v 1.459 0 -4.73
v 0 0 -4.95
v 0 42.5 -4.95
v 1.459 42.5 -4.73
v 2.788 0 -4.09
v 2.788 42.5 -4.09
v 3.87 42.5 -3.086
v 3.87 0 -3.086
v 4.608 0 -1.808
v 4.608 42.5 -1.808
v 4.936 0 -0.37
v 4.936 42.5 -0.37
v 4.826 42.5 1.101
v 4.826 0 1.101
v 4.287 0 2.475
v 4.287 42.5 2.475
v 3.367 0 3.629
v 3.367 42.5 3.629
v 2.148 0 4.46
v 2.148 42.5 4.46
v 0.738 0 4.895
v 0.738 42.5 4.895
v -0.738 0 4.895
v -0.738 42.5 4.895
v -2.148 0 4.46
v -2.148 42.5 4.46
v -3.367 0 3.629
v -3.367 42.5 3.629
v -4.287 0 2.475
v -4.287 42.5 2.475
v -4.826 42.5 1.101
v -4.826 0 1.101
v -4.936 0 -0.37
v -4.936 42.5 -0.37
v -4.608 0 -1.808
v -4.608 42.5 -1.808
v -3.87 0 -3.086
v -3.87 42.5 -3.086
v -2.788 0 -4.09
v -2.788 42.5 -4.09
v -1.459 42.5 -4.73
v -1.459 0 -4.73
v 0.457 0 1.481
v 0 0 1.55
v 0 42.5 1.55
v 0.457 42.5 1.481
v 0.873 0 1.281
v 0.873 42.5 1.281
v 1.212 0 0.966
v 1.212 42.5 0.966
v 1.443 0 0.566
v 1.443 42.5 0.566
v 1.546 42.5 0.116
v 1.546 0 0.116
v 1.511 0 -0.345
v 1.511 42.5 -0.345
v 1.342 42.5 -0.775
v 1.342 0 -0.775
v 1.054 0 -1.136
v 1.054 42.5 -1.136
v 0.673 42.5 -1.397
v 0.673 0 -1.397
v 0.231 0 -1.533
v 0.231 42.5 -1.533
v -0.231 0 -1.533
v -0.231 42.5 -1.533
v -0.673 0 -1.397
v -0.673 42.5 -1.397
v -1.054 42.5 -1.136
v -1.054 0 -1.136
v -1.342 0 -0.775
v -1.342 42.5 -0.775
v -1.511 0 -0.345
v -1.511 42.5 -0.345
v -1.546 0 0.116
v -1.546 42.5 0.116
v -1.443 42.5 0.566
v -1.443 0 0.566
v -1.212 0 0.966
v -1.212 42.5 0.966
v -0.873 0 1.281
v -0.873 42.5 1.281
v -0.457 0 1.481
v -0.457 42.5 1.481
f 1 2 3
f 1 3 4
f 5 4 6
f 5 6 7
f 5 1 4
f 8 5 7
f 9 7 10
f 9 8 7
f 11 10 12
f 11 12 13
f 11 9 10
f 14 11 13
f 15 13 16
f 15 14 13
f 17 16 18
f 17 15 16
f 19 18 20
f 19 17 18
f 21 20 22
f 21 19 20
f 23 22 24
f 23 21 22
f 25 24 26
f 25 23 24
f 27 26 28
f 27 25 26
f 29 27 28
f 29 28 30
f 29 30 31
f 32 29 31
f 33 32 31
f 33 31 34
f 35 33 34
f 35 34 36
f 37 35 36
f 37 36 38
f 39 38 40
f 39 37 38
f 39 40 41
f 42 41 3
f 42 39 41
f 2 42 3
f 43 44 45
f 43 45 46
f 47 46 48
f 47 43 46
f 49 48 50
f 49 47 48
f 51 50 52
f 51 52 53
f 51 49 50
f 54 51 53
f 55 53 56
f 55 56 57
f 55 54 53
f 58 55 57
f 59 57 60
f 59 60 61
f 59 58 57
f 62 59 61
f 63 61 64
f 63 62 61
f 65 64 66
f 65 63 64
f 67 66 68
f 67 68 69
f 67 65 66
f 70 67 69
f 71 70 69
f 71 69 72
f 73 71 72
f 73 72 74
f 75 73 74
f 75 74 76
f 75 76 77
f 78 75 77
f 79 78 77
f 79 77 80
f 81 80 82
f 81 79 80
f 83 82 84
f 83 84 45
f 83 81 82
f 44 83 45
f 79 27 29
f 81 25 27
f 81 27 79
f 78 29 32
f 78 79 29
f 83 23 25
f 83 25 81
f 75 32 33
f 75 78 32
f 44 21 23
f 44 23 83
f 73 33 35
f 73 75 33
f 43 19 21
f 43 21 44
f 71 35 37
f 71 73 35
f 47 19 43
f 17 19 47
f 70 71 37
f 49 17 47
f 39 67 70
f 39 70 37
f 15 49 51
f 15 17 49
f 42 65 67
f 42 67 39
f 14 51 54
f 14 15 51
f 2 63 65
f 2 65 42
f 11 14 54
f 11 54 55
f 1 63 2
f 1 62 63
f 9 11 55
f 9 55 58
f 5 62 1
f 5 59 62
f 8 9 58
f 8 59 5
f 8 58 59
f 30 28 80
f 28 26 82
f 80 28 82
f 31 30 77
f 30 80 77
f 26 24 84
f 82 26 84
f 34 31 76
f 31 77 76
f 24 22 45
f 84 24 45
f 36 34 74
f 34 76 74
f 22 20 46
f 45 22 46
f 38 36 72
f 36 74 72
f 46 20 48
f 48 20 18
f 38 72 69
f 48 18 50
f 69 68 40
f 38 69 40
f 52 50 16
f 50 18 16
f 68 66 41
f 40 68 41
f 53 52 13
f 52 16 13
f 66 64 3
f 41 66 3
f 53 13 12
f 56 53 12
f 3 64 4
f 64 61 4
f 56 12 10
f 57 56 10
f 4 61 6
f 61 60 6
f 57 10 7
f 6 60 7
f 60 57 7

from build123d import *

# Parameters (mm, degrees)
SKETCH_1_R      = 4.725
SKETCH_1_R_2    = 1.55
EXTRUDE_1_DEPTH = 42.5
EXTRUDE_START   = -42.5
SKETCH_2_R      = 4.85
SKETCH_2_R_2    = 4.725
EXTRUDE_2_DEPTH = 42.5
SKETCH_3_R      = 4.875
SKETCH_3_R_2    = 4.85
EXTRUDE_3_DEPTH = 42.5
SKETCH_4_R      = 4.95
SKETCH_4_R_2    = 4.875
EXTRUDE_4_DEPTH = 42.5


with BuildPart() as part:
    # 草图1 → 凸台-拉伸1 (new body)
    with BuildSketch(Plane(origin=(0, 0, 0), x_dir=(1, 0, 0), z_dir=(0, 1, 0))):
        with Locations(Location((0, 0, 0), (0, 0, 270))):
            Circle(SKETCH_1_R)
        with Locations(Location((0, 0, 0), (0, 0, 270))):
            Circle(SKETCH_1_R_2, mode=Mode.SUBTRACT)
    extrude(amount=EXTRUDE_1_DEPTH)

    # 草图2 → 凸台-拉伸2 (add)
    with BuildSketch(Plane(origin=(0, 42.5, 0), x_dir=(1, 0, 0), z_dir=(0, 1, 0)).offset(EXTRUDE_START)):
        with Locations(Location((0, 0, 0), (0, 0, 270))):
            Circle(SKETCH_2_R)
        Circle(SKETCH_2_R_2, mode=Mode.SUBTRACT)
    extrude(amount=EXTRUDE_2_DEPTH)

    # 草图3 → 凸台-拉伸3 (add)
    with BuildSketch(Plane.XZ):
        with Locations(Location((0, 0, 0), (0, 0, 270))):
            Circle(SKETCH_3_R)
        Circle(SKETCH_3_R_2, mode=Mode.SUBTRACT)
    extrude(amount=-EXTRUDE_3_DEPTH)

    # 草图4 → 凸台-拉伸4 (add)
    with BuildSketch(Plane.XZ):
        with Locations(Location((0, 0, 0), (0, 0, 270))):
            Circle(SKETCH_4_R)
        Circle(SKETCH_4_R_2, mode=Mode.SUBTRACT)
    extrude(amount=-EXTRUDE_4_DEPTH)


solid = part.part
